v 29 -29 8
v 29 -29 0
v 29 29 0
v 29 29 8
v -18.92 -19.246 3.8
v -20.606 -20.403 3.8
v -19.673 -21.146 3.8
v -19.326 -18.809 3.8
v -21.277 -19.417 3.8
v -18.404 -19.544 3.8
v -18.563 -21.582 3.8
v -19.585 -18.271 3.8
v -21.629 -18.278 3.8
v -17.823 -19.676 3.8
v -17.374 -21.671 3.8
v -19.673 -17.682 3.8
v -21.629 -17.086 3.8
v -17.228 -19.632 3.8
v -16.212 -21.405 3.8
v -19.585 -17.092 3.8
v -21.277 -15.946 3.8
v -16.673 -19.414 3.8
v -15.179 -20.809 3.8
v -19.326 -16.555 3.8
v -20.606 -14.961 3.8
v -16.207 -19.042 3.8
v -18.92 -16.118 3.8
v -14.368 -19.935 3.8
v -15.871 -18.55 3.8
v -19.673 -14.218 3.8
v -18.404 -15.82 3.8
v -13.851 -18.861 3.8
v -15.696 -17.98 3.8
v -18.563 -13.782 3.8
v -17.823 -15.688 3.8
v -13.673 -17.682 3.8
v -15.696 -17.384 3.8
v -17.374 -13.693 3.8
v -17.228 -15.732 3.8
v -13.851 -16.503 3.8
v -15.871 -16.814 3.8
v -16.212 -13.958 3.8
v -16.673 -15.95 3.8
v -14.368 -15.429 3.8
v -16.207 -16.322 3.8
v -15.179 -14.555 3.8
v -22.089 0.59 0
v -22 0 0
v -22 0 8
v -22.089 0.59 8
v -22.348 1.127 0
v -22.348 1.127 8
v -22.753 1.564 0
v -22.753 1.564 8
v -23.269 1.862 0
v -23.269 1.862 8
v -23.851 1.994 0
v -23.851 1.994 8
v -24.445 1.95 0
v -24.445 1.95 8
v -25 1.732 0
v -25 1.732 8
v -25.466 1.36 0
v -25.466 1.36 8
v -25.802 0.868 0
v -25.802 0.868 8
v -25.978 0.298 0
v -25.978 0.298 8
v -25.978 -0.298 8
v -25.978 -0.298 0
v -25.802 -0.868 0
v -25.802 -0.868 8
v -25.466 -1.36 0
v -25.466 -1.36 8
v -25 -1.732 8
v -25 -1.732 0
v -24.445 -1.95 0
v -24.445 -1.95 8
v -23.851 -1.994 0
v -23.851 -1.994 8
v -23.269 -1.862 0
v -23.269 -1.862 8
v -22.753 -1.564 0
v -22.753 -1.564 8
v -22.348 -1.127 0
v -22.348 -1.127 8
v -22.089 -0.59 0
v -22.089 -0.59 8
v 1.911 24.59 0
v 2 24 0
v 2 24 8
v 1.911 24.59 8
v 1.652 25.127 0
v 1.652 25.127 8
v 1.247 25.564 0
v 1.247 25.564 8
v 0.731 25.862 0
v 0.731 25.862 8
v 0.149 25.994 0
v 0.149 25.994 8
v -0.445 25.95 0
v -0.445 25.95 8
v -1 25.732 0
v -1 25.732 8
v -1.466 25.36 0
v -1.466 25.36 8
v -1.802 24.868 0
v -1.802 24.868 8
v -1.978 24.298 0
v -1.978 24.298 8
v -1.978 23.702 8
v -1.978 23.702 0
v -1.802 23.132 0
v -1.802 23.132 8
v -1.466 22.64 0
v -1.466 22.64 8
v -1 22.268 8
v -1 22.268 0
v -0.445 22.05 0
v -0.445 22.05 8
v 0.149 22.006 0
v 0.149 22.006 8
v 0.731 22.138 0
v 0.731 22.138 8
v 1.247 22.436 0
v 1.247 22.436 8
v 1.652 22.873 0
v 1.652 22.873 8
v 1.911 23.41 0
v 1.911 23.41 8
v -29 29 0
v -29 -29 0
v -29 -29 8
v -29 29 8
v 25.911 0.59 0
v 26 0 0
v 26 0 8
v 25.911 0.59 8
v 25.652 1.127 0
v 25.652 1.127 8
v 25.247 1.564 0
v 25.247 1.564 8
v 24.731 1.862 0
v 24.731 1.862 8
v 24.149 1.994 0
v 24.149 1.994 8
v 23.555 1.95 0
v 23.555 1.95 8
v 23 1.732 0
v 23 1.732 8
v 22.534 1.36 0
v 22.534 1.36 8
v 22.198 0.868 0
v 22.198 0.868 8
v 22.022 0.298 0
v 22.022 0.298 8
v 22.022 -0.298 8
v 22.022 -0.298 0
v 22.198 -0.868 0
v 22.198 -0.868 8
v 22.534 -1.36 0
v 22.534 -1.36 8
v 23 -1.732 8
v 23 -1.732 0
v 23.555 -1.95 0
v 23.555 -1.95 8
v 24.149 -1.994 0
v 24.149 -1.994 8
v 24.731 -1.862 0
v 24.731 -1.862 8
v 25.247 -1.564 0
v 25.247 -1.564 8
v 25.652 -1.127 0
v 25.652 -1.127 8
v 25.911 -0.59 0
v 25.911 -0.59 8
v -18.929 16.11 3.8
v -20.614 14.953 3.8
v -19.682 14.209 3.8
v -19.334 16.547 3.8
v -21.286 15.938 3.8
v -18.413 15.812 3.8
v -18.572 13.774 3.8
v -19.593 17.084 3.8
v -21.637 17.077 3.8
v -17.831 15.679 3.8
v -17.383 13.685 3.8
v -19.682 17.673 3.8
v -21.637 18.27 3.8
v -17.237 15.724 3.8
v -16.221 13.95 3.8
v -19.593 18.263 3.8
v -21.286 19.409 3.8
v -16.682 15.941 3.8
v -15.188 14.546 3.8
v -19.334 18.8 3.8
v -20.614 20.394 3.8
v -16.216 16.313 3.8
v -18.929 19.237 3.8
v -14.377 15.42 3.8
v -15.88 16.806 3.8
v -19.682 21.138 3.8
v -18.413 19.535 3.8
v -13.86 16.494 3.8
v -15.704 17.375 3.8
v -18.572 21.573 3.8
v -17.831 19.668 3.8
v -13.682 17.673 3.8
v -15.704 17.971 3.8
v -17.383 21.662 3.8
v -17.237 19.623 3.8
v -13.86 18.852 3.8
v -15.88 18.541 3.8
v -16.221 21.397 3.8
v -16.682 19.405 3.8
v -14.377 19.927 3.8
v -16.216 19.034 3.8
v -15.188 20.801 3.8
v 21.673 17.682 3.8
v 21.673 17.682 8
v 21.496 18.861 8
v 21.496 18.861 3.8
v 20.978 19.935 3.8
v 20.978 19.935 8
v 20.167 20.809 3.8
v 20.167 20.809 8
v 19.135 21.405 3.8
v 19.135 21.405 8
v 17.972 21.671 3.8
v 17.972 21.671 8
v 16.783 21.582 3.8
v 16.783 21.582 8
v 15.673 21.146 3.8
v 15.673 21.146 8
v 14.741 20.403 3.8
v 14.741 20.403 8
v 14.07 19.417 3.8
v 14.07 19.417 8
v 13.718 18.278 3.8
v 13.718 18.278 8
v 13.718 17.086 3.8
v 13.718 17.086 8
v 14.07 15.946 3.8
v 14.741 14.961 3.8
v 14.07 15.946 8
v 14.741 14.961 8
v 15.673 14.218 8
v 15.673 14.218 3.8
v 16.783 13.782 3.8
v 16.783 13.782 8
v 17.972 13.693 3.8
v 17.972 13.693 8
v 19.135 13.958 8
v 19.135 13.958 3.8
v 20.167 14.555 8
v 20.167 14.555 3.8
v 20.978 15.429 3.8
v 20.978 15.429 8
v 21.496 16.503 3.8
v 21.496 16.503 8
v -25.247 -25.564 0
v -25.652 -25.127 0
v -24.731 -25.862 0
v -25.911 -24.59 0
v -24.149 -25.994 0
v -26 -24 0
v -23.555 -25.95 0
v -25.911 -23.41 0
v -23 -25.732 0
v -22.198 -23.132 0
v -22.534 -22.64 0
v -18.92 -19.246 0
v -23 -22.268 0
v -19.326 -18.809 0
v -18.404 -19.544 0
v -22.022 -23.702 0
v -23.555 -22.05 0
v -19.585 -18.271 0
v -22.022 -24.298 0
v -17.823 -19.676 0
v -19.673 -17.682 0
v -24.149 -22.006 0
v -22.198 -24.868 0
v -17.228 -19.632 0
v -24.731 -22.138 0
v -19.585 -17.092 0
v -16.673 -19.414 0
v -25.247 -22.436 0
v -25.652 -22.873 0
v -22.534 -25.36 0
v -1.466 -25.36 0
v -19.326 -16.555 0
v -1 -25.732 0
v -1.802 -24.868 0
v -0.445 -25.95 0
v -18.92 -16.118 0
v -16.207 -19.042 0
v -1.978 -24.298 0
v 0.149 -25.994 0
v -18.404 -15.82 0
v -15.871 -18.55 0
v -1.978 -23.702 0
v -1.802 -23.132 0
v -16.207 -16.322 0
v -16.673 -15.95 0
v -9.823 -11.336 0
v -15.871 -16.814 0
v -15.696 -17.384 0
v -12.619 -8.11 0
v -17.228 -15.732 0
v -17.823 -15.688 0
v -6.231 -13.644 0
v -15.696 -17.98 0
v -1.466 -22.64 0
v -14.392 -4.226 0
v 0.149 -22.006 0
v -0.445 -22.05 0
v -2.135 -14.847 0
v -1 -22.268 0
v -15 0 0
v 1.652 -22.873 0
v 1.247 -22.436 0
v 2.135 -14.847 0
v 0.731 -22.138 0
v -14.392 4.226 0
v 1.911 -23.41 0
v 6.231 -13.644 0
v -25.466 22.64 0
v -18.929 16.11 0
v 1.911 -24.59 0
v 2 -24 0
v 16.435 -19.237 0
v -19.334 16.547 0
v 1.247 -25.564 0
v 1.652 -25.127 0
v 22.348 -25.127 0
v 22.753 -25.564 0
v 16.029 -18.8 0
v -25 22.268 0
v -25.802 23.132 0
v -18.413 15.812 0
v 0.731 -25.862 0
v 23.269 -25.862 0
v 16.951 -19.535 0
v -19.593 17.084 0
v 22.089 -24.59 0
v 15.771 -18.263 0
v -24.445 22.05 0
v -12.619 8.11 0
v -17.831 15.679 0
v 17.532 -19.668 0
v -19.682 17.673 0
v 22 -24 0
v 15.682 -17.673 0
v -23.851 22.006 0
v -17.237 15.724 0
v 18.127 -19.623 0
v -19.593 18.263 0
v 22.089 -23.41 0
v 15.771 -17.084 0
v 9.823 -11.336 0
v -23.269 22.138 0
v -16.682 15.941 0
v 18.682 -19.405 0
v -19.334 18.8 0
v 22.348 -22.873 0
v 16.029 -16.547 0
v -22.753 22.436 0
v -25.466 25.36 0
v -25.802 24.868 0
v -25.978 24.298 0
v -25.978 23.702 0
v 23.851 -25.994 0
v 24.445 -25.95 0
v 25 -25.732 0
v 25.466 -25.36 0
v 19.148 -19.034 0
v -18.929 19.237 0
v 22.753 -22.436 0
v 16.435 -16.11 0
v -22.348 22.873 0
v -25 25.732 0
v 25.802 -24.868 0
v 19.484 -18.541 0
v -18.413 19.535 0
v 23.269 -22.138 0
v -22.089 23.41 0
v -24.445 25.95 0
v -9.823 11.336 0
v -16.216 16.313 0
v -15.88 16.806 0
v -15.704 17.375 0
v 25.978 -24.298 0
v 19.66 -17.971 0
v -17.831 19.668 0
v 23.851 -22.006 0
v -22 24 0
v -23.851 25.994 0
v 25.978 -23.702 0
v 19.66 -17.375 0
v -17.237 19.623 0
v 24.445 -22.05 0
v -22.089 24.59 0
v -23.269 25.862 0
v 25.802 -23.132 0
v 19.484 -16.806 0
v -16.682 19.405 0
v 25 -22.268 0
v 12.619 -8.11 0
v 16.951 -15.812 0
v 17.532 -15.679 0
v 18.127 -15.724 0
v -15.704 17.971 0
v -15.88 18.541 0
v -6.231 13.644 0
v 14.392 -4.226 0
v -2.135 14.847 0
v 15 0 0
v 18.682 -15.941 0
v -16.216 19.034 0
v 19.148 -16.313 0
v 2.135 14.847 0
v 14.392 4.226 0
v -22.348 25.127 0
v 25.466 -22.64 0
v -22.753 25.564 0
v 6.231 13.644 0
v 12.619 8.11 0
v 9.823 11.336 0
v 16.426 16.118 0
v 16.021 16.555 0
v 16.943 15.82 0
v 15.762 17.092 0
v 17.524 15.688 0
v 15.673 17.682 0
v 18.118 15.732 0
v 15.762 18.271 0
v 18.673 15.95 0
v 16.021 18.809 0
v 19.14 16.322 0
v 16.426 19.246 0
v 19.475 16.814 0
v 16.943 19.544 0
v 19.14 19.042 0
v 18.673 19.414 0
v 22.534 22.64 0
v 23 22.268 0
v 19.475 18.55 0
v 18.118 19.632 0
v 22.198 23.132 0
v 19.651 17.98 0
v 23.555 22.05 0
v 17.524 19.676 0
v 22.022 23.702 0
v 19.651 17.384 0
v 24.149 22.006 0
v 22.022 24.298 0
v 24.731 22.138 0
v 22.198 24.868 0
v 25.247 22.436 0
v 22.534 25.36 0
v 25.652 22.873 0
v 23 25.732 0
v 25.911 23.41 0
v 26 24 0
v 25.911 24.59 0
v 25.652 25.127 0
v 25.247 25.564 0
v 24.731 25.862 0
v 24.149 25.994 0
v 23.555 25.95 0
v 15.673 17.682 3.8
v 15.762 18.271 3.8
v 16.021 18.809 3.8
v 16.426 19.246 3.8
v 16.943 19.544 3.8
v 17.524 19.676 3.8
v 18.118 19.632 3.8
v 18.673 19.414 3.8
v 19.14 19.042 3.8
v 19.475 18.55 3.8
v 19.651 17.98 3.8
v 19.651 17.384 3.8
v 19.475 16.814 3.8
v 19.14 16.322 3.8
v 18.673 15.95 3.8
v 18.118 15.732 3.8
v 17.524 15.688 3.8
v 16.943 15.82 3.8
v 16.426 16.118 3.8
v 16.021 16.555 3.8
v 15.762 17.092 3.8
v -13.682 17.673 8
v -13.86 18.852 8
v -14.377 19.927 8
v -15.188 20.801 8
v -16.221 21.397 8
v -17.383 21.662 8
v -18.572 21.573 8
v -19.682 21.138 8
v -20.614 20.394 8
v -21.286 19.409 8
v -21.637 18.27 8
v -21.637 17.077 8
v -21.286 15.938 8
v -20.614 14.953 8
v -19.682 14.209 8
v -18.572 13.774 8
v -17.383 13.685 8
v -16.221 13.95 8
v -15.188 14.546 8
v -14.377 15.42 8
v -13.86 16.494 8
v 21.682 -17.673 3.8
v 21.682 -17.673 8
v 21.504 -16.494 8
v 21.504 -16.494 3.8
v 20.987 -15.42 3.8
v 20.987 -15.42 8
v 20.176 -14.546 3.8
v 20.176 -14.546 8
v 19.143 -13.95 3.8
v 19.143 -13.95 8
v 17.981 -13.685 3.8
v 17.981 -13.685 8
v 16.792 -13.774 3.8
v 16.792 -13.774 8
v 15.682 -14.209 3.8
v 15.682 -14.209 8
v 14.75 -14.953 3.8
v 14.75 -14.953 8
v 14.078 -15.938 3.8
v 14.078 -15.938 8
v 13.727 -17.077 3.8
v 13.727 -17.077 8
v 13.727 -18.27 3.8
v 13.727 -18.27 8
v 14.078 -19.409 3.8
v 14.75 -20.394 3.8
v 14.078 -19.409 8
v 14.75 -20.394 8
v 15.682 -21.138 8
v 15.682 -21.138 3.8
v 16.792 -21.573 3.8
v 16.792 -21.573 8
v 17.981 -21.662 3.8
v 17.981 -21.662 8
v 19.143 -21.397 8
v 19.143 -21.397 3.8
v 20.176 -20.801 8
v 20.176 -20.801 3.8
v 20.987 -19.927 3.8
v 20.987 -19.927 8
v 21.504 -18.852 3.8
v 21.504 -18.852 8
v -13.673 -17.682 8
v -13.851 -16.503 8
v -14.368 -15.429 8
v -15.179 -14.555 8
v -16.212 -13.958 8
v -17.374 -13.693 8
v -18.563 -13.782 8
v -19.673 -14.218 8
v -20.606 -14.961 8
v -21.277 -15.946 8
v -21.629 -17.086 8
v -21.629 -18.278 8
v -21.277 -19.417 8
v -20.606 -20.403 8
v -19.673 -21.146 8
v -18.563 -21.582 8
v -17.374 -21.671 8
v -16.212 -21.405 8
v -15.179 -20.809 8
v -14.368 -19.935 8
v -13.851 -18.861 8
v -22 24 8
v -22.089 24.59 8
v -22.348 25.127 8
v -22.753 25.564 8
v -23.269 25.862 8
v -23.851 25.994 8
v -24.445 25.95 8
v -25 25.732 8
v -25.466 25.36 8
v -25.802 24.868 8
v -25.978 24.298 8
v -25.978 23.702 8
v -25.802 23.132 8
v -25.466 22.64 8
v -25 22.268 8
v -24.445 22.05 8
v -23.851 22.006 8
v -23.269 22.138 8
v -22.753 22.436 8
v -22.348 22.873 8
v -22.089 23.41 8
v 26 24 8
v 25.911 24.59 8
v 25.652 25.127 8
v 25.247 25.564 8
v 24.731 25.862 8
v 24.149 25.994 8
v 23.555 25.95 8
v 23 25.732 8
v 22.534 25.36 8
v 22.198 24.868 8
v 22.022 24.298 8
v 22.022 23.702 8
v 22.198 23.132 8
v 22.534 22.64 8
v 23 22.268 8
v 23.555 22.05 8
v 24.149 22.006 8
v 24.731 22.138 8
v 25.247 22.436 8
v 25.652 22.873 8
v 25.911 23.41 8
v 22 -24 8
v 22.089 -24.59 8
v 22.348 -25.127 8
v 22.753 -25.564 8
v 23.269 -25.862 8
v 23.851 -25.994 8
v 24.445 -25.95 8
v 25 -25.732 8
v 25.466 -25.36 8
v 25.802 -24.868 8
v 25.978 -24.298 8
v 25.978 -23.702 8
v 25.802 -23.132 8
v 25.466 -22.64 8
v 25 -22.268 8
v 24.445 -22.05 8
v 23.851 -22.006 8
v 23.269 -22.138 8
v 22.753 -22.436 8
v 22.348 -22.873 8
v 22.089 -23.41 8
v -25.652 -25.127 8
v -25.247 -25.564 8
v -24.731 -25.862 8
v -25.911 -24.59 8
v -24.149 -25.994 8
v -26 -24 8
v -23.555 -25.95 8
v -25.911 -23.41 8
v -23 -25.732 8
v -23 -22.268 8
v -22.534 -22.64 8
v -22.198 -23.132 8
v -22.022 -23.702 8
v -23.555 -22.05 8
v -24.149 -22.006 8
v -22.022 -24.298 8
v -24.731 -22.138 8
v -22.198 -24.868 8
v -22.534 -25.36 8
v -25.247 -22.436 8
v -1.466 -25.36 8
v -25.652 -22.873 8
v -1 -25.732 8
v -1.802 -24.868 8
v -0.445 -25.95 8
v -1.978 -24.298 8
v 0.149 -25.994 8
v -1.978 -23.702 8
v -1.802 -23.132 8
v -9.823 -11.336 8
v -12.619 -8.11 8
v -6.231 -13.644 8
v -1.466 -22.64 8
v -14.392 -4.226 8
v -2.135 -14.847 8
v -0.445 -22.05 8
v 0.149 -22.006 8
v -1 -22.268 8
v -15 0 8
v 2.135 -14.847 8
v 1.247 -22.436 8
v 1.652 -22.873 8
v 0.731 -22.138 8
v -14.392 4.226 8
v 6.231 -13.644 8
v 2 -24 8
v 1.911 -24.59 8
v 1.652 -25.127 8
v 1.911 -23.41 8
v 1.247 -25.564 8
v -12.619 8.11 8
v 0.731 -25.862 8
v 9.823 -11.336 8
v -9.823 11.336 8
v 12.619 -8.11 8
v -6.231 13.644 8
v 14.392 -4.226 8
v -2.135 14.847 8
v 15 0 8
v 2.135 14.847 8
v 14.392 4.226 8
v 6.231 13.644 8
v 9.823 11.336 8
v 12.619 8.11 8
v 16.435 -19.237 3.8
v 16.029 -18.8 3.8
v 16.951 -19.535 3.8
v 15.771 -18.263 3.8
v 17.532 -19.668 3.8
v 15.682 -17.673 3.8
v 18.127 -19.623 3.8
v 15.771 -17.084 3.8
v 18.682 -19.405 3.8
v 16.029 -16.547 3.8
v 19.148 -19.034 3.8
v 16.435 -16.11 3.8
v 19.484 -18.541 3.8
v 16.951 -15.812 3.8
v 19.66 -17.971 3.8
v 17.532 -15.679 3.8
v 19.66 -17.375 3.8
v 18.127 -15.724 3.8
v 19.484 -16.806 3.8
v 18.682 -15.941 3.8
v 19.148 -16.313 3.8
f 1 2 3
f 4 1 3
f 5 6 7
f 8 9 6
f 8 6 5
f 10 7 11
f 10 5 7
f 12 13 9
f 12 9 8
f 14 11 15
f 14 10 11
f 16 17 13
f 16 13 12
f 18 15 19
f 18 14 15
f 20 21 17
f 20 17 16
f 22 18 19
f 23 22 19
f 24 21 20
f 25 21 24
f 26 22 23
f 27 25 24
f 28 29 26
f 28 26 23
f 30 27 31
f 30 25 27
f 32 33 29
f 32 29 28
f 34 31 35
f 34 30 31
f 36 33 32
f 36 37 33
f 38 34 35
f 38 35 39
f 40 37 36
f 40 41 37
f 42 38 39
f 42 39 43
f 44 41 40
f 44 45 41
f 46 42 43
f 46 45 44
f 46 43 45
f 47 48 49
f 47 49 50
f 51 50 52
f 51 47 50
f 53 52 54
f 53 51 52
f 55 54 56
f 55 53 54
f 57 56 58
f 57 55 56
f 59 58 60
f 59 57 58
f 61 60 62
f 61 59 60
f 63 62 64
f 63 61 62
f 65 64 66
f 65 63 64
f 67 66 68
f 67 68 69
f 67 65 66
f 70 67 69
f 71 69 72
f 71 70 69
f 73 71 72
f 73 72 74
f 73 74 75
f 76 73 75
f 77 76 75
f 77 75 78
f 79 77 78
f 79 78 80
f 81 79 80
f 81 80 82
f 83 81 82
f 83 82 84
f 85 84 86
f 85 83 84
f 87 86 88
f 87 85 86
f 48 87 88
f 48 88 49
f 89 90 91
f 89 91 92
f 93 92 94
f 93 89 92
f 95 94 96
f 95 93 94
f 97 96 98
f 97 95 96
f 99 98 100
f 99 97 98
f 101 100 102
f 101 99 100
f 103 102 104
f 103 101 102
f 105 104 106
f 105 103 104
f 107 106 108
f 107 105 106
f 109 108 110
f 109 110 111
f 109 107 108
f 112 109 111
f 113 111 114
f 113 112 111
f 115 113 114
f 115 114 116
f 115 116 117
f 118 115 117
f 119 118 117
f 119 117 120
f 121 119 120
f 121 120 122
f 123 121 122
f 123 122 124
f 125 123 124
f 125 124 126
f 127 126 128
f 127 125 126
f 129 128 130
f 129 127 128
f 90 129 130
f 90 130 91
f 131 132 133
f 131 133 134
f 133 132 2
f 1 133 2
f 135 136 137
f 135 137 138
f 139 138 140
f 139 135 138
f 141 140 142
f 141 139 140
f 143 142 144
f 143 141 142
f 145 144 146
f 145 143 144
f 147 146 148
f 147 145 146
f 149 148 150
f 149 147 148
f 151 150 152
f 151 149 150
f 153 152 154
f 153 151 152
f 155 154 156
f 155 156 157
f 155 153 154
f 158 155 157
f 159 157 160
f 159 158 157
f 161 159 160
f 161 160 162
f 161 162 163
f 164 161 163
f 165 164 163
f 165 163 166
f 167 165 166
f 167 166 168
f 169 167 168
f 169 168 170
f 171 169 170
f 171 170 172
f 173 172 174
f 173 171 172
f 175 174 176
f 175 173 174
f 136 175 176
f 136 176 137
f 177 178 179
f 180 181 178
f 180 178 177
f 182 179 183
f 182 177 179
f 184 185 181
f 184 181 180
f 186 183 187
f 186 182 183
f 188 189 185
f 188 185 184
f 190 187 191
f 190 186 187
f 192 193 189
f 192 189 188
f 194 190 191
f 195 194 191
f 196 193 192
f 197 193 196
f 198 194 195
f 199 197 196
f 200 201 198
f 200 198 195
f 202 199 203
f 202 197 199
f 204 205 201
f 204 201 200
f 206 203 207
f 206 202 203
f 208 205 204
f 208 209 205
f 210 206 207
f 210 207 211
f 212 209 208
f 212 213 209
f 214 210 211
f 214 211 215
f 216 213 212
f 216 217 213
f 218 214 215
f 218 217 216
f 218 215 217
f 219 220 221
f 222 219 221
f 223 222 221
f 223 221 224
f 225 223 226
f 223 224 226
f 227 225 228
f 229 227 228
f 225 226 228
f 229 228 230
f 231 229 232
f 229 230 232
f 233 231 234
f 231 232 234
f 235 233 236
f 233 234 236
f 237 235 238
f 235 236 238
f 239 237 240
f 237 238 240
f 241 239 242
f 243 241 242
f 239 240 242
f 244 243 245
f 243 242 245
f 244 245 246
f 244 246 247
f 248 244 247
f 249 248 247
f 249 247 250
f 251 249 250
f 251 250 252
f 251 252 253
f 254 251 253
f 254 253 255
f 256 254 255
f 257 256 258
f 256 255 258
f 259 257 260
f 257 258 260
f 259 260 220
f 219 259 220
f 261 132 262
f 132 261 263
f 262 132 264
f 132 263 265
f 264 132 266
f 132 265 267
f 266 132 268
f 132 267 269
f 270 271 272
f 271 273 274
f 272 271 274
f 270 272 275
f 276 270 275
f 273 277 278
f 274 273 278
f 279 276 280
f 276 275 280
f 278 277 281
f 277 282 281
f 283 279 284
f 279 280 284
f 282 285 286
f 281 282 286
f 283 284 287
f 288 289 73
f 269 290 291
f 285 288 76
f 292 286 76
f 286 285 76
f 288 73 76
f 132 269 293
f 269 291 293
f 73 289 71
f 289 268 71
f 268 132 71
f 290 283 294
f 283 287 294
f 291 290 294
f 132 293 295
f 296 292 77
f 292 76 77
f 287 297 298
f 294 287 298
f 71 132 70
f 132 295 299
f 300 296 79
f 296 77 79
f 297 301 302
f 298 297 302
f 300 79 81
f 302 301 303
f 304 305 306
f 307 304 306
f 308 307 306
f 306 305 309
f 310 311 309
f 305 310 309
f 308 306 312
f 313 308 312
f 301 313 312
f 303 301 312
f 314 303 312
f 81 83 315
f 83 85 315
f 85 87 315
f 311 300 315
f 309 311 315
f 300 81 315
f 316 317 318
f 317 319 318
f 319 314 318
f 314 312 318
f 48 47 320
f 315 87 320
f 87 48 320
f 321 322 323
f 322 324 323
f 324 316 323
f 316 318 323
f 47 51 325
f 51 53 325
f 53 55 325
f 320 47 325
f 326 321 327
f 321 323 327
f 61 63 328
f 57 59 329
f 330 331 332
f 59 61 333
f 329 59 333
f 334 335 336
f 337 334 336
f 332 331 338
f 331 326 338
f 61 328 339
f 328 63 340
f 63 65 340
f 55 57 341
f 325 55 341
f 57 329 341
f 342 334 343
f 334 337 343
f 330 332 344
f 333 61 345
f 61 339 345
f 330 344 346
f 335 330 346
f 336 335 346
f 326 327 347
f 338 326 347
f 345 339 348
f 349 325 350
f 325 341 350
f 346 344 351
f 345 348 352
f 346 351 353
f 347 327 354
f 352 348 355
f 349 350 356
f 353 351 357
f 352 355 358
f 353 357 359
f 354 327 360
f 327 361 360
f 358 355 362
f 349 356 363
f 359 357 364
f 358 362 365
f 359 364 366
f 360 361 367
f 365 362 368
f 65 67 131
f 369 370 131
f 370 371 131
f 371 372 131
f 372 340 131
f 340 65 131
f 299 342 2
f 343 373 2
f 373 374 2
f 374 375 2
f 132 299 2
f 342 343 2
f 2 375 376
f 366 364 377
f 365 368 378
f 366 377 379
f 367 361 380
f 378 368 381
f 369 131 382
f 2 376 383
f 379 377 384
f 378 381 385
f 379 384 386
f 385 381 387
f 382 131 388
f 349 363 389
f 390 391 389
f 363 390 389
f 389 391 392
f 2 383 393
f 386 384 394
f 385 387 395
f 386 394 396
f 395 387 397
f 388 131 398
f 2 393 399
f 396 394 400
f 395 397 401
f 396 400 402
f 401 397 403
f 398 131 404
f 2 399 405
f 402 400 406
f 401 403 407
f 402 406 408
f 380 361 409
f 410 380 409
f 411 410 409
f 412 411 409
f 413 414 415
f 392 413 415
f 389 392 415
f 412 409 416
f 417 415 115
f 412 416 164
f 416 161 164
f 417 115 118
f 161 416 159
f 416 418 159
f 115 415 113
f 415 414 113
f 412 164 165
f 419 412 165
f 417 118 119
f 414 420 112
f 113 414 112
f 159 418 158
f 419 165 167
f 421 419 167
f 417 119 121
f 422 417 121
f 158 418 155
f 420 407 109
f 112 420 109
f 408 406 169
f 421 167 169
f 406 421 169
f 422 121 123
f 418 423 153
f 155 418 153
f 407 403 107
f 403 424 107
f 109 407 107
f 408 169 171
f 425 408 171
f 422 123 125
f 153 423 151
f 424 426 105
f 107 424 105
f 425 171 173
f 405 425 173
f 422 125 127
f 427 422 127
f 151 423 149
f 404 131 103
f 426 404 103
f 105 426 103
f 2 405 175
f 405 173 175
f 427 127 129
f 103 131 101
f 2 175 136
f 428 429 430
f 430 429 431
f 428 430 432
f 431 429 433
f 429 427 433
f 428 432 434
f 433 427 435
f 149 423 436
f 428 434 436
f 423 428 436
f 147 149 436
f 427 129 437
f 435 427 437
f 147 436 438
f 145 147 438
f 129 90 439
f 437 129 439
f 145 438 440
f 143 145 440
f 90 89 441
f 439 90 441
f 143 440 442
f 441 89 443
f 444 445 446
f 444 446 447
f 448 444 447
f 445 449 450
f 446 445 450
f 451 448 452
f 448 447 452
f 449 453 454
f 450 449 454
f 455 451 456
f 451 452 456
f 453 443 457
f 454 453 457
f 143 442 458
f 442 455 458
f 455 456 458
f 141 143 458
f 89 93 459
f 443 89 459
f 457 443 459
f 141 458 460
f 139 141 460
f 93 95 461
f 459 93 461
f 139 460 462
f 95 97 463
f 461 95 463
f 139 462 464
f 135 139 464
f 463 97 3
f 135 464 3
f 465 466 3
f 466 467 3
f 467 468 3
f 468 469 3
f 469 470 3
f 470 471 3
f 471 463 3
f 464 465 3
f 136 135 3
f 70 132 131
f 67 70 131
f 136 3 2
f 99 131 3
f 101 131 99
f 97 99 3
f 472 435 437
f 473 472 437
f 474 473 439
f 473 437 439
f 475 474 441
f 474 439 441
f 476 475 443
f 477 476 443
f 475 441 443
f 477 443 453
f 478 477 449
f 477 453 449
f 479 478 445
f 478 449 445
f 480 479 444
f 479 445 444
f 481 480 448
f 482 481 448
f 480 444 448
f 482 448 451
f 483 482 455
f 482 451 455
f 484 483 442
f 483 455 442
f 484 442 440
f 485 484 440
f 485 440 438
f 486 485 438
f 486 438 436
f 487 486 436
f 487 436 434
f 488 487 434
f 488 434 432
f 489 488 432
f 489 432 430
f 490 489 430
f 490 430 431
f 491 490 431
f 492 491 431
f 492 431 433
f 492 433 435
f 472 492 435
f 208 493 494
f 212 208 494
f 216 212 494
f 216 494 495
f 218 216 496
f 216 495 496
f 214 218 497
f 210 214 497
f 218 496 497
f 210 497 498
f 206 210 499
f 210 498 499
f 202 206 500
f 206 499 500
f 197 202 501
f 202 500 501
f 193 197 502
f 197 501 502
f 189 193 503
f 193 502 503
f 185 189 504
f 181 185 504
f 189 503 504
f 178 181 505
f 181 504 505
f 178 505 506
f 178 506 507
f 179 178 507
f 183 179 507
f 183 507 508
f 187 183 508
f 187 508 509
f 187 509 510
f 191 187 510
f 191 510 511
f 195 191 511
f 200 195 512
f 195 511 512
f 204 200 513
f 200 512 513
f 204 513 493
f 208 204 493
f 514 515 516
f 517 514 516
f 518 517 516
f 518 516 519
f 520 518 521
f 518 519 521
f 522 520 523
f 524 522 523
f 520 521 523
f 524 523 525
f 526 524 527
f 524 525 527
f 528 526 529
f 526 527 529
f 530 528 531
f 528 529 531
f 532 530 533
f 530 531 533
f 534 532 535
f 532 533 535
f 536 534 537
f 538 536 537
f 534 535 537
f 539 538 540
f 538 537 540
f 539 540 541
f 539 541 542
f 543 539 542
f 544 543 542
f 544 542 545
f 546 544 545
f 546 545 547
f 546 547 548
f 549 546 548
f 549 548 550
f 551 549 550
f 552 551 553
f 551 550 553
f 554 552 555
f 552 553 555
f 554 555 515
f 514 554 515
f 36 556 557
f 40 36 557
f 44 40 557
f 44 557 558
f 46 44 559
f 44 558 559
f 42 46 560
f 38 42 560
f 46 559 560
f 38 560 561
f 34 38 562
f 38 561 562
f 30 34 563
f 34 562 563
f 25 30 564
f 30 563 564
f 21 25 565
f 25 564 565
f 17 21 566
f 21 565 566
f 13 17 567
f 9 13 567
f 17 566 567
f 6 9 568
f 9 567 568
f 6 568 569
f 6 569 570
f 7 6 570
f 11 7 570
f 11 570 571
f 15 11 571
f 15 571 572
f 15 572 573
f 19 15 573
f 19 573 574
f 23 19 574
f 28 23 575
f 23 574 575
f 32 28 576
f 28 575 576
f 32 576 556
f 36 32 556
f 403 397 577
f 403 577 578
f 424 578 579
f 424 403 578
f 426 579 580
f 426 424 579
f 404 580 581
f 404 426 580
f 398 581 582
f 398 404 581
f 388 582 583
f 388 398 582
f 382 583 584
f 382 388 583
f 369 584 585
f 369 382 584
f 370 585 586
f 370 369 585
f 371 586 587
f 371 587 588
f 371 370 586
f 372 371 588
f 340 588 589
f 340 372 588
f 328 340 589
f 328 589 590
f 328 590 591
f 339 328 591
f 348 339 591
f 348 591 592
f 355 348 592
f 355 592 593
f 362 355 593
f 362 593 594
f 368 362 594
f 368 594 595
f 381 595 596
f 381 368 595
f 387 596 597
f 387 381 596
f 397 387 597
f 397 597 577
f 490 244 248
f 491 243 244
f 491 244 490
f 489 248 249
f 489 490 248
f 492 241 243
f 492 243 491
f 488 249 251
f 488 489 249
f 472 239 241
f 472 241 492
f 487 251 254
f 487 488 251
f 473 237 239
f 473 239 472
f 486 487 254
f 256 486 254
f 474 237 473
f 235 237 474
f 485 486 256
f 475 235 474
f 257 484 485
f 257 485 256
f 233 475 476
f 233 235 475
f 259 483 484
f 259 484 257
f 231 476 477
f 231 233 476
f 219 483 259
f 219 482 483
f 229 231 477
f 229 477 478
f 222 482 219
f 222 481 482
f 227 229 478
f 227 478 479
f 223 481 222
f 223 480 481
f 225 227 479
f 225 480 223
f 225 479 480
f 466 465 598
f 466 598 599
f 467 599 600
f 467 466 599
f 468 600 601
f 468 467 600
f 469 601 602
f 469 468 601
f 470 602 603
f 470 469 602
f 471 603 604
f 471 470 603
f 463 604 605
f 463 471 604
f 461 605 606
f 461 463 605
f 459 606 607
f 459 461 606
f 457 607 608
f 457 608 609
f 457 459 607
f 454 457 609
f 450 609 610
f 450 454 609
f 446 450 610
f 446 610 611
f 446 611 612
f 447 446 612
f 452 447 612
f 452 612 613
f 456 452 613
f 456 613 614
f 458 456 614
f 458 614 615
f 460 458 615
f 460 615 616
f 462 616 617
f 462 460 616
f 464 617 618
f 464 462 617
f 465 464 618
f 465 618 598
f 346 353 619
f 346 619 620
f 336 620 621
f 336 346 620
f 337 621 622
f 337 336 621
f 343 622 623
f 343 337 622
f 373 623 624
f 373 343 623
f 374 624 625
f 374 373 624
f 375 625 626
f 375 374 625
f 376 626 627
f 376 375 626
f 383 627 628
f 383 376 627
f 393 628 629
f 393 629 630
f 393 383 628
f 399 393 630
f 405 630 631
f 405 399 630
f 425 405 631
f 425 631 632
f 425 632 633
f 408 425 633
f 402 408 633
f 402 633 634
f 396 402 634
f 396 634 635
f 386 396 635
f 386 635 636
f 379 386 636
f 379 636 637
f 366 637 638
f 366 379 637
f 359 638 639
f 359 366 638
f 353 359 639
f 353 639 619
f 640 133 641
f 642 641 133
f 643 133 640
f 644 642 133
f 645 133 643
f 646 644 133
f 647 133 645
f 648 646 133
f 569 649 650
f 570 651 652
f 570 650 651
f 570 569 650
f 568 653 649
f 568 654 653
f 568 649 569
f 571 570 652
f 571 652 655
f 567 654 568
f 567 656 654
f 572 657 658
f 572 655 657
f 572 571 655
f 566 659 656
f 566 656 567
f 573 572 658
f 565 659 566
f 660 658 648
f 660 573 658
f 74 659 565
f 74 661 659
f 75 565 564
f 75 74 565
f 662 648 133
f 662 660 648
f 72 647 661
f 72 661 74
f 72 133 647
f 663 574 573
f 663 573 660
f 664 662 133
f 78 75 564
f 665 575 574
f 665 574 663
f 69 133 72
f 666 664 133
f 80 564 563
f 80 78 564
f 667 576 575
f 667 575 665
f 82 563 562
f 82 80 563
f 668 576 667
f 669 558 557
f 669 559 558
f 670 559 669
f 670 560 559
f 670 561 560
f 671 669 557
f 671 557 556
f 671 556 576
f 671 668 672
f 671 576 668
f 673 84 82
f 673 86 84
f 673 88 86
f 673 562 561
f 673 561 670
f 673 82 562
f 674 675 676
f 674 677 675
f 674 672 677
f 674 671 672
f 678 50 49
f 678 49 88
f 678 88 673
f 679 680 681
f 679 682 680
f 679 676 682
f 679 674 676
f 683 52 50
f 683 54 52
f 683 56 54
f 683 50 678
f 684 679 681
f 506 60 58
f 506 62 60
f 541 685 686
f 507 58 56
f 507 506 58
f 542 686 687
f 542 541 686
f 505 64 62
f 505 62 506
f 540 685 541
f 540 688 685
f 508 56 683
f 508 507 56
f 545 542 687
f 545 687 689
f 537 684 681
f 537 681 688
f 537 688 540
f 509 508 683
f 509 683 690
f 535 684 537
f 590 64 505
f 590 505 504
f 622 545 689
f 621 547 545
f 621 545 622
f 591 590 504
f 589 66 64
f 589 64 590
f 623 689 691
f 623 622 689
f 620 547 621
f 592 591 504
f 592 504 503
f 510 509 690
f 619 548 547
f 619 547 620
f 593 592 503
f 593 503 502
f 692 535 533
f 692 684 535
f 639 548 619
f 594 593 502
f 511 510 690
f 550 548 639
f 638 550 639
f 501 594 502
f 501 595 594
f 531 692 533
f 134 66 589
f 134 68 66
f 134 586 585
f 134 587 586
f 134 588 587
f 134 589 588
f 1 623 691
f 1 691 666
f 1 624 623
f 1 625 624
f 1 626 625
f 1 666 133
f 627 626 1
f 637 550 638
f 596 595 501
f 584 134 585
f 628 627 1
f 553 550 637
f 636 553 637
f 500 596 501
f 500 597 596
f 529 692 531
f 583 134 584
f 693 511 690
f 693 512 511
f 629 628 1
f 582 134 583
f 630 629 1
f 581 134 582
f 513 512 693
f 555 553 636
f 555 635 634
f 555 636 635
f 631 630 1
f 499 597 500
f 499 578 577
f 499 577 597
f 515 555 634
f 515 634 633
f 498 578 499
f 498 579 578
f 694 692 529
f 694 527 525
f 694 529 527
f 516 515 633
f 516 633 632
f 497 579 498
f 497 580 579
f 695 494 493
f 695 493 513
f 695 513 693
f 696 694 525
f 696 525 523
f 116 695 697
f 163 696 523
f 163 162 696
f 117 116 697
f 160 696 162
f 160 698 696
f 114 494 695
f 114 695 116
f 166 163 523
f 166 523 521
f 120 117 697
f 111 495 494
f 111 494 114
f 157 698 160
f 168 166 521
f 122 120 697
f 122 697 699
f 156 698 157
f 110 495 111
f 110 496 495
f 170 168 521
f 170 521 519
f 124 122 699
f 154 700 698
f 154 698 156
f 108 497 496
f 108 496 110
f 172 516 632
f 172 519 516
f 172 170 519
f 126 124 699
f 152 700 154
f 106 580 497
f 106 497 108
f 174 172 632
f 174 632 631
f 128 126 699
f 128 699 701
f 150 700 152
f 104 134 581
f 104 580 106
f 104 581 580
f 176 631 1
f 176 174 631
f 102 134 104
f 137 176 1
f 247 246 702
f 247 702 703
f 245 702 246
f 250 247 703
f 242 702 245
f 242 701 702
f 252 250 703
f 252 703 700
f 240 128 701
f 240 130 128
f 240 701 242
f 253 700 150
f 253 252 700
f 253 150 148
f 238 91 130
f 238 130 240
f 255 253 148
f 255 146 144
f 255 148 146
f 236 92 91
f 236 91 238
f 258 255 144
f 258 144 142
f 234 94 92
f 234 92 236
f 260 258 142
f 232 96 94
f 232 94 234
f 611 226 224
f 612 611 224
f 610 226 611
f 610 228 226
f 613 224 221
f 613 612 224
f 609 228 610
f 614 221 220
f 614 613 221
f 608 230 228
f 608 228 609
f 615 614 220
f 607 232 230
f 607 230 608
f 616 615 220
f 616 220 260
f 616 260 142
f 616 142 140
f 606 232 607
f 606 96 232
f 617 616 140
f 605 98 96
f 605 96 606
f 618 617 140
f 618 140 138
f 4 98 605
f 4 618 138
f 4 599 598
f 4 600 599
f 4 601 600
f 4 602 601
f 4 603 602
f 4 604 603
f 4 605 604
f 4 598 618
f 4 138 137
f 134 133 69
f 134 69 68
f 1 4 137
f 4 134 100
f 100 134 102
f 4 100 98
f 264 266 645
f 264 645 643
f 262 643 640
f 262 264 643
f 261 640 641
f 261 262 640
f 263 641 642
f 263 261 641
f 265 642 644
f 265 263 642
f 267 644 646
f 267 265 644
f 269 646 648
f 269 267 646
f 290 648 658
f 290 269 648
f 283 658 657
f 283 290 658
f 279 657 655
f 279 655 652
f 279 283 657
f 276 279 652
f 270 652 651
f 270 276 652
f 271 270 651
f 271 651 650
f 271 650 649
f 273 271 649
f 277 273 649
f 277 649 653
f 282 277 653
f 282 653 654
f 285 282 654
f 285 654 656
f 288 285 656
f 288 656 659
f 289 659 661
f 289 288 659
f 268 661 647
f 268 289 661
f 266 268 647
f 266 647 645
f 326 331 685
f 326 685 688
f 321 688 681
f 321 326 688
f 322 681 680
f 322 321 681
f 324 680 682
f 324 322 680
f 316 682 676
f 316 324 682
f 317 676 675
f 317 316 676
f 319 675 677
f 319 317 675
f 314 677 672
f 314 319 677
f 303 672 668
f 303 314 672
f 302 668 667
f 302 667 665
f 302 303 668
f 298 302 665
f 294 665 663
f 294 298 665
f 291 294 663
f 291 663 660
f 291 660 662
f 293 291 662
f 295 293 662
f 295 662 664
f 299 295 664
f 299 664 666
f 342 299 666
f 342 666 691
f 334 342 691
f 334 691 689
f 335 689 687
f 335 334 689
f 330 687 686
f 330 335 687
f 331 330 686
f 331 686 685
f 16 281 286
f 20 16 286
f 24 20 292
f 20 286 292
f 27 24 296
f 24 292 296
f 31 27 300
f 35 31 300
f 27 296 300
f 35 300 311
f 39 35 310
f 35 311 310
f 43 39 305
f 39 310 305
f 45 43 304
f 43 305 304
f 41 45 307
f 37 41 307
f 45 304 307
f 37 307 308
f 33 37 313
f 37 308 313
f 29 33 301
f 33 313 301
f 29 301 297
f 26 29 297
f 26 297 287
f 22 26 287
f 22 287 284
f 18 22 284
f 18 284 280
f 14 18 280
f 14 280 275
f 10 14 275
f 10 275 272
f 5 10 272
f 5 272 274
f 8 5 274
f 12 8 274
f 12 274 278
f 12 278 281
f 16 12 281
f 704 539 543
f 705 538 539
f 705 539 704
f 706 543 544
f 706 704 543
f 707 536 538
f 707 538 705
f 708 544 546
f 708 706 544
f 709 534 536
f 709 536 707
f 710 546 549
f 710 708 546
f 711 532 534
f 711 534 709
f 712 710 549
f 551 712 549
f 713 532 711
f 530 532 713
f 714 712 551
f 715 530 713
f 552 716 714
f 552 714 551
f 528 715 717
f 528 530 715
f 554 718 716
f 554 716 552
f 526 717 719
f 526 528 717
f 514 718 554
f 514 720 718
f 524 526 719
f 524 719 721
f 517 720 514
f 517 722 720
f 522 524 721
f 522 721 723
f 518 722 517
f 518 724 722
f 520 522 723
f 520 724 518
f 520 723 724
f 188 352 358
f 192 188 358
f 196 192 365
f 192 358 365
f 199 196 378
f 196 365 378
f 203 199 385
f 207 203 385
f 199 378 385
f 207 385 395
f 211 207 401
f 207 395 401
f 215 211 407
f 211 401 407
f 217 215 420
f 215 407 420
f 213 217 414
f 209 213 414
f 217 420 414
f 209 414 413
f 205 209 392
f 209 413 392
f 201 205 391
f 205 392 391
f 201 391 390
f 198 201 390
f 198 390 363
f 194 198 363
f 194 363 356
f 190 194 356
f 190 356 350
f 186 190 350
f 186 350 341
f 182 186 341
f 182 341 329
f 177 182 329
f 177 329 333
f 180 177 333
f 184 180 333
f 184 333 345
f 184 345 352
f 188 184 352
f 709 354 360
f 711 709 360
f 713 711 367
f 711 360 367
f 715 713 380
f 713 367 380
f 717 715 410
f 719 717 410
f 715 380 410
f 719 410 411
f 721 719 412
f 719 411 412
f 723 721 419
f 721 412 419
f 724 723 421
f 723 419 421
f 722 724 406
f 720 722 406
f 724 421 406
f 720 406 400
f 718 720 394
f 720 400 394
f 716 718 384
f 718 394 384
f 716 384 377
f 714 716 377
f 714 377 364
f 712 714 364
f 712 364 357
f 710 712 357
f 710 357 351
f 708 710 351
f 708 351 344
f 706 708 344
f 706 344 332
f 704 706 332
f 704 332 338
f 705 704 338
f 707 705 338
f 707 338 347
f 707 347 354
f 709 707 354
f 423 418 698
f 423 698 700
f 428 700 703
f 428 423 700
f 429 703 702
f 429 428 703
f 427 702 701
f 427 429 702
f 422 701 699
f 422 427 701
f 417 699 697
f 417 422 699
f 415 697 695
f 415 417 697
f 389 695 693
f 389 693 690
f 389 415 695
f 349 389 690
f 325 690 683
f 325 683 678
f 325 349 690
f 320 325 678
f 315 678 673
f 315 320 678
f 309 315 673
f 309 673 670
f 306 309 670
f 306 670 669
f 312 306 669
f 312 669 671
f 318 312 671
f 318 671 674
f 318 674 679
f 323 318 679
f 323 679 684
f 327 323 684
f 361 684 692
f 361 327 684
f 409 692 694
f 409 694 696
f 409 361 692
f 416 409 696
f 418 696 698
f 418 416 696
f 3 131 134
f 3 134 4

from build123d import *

# Parameters (mm, degrees)
SKETCH1_W           = 58
SKETCH1_H           = 58
SKETCH1_R           = 15
SKETCH1_R_2         = 2
BOSS_EXTRUDE1_DEPTH = 8
SKETCH3_R           = 2
CUT_EXTRUDE1_DEPTH  = 42.785164832
SKETCH4_R           = 4
CUT_EXTRUDE2_DEPTH  = 4.2


with BuildPart() as part:
    # Sketch1 → Boss-Extrude1 (new body)
    with BuildSketch(Plane.XY):
        Rectangle(SKETCH1_W, SKETCH1_H)
        Circle(SKETCH1_R, mode=Mode.SUBTRACT)
        with Locations((0, 24)):
            Circle(SKETCH1_R_2, mode=Mode.SUBTRACT)
        with Locations((-24, 24)):
            Circle(SKETCH1_R_2, mode=Mode.SUBTRACT)
        with Locations((24, 0)):
            Circle(SKETCH1_R_2, mode=Mode.SUBTRACT)
        with Locations((0, -24)):
            Circle(SKETCH1_R_2, mode=Mode.SUBTRACT)
        with Locations((-24, 0)):
            Circle(SKETCH1_R_2, mode=Mode.SUBTRACT)
        with Locations(Location((24, -24, 0), (0, 0, 180))):
            Circle(SKETCH1_R_2, mode=Mode.SUBTRACT)
        with Locations((24, 24)):
            Circle(SKETCH1_R_2, mode=Mode.SUBTRACT)
        with Locations(Location((-24, -24, 0), (0, 0, 180))):
            Circle(SKETCH1_R_2, mode=Mode.SUBTRACT)
    extrude(amount=BOSS_EXTRUDE1_DEPTH)

    # Sketch3 → Cut-Extrude1 (cut, through all)
    with BuildSketch(Plane(origin=(0, 0, 0), x_dir=(-1, 0, 0), z_dir=(0, 0, -1))):
        with Locations((-17.673408237, 17.681929795)):
            Circle(SKETCH3_R)
        with Locations((17.681929795, 17.673408237)):
            Circle(SKETCH3_R)
        with Locations((17.673408237, -17.681929795)):
            Circle(SKETCH3_R)
        with Locations((-17.681929795, -17.673408237)):
            Circle(SKETCH3_R)
    extrude(amount=-CUT_EXTRUDE1_DEPTH, mode=Mode.SUBTRACT)

    # Sketch4 → Cut-Extrude2 (cut)
    with BuildSketch(Plane.XY.offset(8)):
        with Locations((-17.681929795, 17.673408237)):
            Circle(SKETCH4_R)
        with Locations((17.673408237, 17.681929795)):
            Circle(SKETCH4_R)
        with Locations((17.681929795, -17.673408237)):
            Circle(SKETCH4_R)
        with Locations((-17.673408237, -17.681929795)):
            Circle(SKETCH4_R)
    extrude(amount=-CUT_EXTRUDE2_DEPTH, mode=Mode.SUBTRACT)


solid = part.part
